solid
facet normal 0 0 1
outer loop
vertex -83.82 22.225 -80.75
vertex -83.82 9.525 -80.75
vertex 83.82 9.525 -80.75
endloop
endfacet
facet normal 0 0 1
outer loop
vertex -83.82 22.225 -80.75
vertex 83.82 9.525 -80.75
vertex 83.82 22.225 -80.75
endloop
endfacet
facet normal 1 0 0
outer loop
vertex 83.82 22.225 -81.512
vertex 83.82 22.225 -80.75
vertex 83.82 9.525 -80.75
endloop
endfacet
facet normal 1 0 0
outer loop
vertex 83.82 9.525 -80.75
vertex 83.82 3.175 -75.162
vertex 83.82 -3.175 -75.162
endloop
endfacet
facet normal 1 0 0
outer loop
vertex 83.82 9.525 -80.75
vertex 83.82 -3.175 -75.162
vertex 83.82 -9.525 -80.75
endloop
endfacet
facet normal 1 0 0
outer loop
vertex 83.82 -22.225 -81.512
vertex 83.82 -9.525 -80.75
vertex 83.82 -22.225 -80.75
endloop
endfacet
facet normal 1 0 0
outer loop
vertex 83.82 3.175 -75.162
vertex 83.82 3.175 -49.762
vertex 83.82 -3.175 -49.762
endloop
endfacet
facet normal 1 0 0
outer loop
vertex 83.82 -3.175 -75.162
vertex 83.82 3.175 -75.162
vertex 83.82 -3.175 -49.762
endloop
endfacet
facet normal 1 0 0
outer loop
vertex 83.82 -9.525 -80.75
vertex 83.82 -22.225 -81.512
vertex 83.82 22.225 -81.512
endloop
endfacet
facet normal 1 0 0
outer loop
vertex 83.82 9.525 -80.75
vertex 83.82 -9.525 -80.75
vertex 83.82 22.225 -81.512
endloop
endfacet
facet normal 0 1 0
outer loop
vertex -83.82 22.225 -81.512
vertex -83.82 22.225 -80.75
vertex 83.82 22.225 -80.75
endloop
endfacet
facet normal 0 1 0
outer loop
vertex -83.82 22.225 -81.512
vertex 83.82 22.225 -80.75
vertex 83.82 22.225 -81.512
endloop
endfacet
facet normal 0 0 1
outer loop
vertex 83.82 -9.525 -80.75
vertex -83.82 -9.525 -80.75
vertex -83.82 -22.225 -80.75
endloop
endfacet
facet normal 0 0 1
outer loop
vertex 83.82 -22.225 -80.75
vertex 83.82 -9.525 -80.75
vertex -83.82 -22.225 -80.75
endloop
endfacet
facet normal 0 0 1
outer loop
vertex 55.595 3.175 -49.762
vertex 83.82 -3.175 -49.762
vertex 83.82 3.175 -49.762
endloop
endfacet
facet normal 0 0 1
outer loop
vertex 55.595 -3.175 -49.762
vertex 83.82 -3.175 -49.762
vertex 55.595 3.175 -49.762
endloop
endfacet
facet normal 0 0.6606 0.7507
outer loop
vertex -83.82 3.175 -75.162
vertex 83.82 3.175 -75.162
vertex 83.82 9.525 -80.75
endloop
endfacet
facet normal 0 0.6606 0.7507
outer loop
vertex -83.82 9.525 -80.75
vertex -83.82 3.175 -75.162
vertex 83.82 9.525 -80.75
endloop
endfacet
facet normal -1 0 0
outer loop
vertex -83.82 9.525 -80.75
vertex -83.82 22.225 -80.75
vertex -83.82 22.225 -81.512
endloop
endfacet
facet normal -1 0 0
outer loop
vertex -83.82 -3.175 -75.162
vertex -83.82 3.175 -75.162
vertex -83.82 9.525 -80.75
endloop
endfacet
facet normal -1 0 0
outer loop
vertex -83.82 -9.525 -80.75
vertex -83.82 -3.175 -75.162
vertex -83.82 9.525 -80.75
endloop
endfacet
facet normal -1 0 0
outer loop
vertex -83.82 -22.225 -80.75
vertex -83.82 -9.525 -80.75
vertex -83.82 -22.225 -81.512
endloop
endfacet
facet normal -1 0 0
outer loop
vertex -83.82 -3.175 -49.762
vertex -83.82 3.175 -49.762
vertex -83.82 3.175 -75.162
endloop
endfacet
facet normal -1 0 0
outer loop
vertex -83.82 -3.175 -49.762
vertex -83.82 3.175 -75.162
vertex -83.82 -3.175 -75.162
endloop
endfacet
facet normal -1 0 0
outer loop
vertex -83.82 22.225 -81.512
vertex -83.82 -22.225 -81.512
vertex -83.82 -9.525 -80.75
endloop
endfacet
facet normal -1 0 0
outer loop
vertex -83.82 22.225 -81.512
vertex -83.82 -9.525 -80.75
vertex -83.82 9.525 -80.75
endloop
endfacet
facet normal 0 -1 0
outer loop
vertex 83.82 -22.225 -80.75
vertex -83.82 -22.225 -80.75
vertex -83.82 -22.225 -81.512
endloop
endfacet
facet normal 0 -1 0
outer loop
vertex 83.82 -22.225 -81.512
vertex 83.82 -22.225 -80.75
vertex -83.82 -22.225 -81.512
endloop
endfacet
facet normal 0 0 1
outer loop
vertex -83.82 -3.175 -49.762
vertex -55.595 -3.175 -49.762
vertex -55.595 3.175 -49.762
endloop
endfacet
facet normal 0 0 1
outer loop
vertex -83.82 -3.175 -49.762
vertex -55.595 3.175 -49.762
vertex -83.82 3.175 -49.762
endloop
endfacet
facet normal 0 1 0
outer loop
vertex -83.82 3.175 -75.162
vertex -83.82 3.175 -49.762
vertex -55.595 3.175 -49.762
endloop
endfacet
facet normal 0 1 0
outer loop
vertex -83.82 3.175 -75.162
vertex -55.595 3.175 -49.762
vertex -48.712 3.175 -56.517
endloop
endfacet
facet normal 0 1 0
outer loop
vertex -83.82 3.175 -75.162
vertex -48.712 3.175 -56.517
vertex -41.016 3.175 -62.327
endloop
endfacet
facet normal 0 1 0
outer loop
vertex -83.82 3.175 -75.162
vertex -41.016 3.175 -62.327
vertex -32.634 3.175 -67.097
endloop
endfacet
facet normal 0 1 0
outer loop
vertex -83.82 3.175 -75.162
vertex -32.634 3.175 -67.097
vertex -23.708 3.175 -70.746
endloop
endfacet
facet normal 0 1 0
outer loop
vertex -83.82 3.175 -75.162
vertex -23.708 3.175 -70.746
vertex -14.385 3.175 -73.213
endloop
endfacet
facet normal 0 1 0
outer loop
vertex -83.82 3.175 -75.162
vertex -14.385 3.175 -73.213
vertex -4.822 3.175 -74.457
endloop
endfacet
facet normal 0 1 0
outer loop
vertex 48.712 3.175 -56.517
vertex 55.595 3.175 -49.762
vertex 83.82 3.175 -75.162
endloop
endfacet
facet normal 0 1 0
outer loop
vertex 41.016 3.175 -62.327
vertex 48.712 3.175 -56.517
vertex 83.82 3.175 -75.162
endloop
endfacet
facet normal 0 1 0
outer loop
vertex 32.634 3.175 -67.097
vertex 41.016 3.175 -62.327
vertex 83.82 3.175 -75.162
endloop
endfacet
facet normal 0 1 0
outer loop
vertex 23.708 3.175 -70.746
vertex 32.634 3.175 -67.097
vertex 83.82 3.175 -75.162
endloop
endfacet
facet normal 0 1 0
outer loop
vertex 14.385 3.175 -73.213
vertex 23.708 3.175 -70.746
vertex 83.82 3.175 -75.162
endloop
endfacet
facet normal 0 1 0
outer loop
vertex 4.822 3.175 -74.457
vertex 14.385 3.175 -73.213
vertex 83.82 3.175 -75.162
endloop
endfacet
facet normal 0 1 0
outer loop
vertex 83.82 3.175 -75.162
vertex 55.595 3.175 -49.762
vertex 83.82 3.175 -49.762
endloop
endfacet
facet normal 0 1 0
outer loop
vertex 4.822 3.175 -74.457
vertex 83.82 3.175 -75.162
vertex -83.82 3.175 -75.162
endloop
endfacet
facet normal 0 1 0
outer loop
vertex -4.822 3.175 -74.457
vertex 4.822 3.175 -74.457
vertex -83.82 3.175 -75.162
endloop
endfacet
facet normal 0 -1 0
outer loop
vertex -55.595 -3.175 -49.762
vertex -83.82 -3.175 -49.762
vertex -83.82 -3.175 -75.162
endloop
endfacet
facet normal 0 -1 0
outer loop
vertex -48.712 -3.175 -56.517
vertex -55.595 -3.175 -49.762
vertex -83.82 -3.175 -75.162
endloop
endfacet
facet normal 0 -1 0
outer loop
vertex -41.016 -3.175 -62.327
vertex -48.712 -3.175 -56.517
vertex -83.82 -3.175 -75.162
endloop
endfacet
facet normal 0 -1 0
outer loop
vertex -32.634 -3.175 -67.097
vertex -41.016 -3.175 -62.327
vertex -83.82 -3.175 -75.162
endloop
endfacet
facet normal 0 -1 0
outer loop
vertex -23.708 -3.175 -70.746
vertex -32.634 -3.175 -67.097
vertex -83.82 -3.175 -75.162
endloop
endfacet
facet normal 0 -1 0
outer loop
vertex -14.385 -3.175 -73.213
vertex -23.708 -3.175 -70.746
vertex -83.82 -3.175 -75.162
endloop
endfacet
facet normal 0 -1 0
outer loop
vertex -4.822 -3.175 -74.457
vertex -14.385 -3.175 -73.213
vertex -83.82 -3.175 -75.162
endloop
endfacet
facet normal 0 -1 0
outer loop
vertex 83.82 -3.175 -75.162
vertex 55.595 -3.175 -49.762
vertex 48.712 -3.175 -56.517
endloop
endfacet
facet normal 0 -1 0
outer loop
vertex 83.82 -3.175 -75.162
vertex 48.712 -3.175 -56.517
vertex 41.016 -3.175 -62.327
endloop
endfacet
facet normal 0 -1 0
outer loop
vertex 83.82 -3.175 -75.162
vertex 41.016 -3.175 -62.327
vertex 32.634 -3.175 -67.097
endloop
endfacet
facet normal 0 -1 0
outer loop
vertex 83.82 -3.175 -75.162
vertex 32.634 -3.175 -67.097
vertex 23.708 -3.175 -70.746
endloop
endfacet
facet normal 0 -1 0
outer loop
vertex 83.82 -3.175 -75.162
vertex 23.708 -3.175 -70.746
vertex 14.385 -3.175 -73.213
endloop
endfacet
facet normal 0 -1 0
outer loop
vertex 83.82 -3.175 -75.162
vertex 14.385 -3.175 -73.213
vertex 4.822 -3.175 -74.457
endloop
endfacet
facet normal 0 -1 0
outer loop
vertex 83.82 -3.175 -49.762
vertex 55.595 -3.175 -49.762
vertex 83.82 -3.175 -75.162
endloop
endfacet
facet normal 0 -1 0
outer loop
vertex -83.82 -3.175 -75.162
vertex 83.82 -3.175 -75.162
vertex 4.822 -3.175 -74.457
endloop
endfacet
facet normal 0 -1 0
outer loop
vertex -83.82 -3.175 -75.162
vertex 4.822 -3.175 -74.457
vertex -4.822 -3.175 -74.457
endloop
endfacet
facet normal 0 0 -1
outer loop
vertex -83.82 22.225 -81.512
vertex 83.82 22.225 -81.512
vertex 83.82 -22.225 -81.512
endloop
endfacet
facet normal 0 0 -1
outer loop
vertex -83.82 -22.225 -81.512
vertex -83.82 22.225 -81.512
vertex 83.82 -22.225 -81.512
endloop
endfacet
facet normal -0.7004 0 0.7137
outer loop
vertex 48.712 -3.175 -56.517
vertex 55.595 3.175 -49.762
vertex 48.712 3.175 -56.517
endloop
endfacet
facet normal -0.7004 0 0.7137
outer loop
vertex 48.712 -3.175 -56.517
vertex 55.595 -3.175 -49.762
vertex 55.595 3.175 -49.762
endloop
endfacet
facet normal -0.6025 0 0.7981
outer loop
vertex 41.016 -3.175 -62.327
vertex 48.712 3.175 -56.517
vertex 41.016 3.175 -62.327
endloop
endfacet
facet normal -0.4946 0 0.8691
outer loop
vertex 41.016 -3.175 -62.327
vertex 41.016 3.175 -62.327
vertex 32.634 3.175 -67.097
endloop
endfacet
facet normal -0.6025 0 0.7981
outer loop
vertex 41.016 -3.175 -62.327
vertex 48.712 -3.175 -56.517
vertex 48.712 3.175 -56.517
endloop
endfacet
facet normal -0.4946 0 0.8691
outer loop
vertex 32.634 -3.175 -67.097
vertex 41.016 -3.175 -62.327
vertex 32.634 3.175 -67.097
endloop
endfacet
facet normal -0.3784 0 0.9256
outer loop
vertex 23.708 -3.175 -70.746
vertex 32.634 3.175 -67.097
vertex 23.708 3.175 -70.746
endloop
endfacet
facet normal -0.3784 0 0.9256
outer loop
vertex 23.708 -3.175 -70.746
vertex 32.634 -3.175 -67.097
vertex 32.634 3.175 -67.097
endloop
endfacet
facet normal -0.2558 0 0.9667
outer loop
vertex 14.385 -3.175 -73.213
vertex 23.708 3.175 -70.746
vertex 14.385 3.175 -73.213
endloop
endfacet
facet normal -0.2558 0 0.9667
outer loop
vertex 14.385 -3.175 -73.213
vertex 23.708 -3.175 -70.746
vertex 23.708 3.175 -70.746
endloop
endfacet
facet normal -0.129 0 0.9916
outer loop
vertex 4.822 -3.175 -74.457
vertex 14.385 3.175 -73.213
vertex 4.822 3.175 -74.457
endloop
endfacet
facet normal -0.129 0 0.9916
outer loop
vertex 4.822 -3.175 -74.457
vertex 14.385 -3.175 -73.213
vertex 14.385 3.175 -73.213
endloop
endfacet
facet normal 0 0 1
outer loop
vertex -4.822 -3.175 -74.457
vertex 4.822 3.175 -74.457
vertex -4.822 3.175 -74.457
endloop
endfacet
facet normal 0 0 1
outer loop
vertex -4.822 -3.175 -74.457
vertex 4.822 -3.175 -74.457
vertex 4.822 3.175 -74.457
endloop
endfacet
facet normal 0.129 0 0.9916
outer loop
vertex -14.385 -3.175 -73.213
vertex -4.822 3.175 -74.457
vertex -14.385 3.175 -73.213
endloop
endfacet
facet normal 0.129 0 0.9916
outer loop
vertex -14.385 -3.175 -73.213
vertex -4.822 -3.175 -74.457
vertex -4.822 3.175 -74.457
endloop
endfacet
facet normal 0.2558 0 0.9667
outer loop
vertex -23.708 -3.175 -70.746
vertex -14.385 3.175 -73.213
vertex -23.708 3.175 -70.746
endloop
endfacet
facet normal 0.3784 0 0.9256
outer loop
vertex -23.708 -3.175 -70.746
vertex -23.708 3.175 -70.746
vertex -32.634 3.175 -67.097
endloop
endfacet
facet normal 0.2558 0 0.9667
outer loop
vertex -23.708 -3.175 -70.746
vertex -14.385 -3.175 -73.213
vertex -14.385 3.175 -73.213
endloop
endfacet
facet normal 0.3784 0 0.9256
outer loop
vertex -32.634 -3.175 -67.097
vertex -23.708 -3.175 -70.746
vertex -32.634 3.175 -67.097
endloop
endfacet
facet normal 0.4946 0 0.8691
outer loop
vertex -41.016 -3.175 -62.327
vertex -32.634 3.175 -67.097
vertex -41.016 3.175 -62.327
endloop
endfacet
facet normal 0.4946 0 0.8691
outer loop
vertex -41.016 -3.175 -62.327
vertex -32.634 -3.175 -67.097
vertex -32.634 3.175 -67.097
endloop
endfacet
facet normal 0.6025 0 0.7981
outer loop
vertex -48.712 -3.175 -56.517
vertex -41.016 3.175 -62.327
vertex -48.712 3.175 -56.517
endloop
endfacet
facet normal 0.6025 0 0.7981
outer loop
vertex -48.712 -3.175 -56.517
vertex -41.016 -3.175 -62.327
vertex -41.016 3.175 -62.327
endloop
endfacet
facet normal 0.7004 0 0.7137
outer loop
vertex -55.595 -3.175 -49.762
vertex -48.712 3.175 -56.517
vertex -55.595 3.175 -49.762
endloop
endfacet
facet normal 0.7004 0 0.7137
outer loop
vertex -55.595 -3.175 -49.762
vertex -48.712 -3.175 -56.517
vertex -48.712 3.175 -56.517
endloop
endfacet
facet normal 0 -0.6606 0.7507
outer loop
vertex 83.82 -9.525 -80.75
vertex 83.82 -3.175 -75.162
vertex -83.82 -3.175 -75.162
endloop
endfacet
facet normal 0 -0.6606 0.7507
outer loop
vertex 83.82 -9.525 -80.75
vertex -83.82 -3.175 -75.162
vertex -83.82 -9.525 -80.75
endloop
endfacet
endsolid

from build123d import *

# Parameters (mm, degrees)
F1_DEPTH = 3.175
F3_DEPTH = 167.64


# Not quite as in the source:
# - a pattern or mirror of a feature is missing from the dataset's text; its kind, count and spacing are read off the source's solid


with BuildPart() as f1:
    # F0 (on Front) → F1 (new body, symmetric)
    with BuildSketch(Plane.XZ):
        with BuildLine():
            ThreePointArc((55.5949879174, -49.7616566718), (0, -74.6125), (-55.5949879174, -49.7616566718))
            Line((-55.5949879174, -49.7616566718), (-83.82, -49.7616566718))
            Line((-83.82, -49.7616566718), (-83.82, -81.5116566718))
            Line((-83.82, -81.5116566718), (83.82, -81.5116566718))
            Line((83.82, -81.5116566718), (83.82, -49.7616566718))
            Line((83.82, -49.7616566718), (55.5949879174, -49.7616566718))
        make_face()
    extrude(amount=F1_DEPTH, both=True)

    # F2 (on face) → F3 (join, through all)
    with BuildSketch(Plane.YZ.offset(83.82)):
        Polygon((-3.175, -81.5116566718), (-3.175, -75.1616566718), (-9.525, -80.7496566718), (-22.225, -80.7496566718), (-22.225, -81.5116566718), (-10.3909090909, -81.5116566718), align=None)
    f3 = extrude(amount=-F3_DEPTH)

    # F3_copies: F3 across plane
    add(f3.mirror(Plane.ZX))


solid = f1.part
